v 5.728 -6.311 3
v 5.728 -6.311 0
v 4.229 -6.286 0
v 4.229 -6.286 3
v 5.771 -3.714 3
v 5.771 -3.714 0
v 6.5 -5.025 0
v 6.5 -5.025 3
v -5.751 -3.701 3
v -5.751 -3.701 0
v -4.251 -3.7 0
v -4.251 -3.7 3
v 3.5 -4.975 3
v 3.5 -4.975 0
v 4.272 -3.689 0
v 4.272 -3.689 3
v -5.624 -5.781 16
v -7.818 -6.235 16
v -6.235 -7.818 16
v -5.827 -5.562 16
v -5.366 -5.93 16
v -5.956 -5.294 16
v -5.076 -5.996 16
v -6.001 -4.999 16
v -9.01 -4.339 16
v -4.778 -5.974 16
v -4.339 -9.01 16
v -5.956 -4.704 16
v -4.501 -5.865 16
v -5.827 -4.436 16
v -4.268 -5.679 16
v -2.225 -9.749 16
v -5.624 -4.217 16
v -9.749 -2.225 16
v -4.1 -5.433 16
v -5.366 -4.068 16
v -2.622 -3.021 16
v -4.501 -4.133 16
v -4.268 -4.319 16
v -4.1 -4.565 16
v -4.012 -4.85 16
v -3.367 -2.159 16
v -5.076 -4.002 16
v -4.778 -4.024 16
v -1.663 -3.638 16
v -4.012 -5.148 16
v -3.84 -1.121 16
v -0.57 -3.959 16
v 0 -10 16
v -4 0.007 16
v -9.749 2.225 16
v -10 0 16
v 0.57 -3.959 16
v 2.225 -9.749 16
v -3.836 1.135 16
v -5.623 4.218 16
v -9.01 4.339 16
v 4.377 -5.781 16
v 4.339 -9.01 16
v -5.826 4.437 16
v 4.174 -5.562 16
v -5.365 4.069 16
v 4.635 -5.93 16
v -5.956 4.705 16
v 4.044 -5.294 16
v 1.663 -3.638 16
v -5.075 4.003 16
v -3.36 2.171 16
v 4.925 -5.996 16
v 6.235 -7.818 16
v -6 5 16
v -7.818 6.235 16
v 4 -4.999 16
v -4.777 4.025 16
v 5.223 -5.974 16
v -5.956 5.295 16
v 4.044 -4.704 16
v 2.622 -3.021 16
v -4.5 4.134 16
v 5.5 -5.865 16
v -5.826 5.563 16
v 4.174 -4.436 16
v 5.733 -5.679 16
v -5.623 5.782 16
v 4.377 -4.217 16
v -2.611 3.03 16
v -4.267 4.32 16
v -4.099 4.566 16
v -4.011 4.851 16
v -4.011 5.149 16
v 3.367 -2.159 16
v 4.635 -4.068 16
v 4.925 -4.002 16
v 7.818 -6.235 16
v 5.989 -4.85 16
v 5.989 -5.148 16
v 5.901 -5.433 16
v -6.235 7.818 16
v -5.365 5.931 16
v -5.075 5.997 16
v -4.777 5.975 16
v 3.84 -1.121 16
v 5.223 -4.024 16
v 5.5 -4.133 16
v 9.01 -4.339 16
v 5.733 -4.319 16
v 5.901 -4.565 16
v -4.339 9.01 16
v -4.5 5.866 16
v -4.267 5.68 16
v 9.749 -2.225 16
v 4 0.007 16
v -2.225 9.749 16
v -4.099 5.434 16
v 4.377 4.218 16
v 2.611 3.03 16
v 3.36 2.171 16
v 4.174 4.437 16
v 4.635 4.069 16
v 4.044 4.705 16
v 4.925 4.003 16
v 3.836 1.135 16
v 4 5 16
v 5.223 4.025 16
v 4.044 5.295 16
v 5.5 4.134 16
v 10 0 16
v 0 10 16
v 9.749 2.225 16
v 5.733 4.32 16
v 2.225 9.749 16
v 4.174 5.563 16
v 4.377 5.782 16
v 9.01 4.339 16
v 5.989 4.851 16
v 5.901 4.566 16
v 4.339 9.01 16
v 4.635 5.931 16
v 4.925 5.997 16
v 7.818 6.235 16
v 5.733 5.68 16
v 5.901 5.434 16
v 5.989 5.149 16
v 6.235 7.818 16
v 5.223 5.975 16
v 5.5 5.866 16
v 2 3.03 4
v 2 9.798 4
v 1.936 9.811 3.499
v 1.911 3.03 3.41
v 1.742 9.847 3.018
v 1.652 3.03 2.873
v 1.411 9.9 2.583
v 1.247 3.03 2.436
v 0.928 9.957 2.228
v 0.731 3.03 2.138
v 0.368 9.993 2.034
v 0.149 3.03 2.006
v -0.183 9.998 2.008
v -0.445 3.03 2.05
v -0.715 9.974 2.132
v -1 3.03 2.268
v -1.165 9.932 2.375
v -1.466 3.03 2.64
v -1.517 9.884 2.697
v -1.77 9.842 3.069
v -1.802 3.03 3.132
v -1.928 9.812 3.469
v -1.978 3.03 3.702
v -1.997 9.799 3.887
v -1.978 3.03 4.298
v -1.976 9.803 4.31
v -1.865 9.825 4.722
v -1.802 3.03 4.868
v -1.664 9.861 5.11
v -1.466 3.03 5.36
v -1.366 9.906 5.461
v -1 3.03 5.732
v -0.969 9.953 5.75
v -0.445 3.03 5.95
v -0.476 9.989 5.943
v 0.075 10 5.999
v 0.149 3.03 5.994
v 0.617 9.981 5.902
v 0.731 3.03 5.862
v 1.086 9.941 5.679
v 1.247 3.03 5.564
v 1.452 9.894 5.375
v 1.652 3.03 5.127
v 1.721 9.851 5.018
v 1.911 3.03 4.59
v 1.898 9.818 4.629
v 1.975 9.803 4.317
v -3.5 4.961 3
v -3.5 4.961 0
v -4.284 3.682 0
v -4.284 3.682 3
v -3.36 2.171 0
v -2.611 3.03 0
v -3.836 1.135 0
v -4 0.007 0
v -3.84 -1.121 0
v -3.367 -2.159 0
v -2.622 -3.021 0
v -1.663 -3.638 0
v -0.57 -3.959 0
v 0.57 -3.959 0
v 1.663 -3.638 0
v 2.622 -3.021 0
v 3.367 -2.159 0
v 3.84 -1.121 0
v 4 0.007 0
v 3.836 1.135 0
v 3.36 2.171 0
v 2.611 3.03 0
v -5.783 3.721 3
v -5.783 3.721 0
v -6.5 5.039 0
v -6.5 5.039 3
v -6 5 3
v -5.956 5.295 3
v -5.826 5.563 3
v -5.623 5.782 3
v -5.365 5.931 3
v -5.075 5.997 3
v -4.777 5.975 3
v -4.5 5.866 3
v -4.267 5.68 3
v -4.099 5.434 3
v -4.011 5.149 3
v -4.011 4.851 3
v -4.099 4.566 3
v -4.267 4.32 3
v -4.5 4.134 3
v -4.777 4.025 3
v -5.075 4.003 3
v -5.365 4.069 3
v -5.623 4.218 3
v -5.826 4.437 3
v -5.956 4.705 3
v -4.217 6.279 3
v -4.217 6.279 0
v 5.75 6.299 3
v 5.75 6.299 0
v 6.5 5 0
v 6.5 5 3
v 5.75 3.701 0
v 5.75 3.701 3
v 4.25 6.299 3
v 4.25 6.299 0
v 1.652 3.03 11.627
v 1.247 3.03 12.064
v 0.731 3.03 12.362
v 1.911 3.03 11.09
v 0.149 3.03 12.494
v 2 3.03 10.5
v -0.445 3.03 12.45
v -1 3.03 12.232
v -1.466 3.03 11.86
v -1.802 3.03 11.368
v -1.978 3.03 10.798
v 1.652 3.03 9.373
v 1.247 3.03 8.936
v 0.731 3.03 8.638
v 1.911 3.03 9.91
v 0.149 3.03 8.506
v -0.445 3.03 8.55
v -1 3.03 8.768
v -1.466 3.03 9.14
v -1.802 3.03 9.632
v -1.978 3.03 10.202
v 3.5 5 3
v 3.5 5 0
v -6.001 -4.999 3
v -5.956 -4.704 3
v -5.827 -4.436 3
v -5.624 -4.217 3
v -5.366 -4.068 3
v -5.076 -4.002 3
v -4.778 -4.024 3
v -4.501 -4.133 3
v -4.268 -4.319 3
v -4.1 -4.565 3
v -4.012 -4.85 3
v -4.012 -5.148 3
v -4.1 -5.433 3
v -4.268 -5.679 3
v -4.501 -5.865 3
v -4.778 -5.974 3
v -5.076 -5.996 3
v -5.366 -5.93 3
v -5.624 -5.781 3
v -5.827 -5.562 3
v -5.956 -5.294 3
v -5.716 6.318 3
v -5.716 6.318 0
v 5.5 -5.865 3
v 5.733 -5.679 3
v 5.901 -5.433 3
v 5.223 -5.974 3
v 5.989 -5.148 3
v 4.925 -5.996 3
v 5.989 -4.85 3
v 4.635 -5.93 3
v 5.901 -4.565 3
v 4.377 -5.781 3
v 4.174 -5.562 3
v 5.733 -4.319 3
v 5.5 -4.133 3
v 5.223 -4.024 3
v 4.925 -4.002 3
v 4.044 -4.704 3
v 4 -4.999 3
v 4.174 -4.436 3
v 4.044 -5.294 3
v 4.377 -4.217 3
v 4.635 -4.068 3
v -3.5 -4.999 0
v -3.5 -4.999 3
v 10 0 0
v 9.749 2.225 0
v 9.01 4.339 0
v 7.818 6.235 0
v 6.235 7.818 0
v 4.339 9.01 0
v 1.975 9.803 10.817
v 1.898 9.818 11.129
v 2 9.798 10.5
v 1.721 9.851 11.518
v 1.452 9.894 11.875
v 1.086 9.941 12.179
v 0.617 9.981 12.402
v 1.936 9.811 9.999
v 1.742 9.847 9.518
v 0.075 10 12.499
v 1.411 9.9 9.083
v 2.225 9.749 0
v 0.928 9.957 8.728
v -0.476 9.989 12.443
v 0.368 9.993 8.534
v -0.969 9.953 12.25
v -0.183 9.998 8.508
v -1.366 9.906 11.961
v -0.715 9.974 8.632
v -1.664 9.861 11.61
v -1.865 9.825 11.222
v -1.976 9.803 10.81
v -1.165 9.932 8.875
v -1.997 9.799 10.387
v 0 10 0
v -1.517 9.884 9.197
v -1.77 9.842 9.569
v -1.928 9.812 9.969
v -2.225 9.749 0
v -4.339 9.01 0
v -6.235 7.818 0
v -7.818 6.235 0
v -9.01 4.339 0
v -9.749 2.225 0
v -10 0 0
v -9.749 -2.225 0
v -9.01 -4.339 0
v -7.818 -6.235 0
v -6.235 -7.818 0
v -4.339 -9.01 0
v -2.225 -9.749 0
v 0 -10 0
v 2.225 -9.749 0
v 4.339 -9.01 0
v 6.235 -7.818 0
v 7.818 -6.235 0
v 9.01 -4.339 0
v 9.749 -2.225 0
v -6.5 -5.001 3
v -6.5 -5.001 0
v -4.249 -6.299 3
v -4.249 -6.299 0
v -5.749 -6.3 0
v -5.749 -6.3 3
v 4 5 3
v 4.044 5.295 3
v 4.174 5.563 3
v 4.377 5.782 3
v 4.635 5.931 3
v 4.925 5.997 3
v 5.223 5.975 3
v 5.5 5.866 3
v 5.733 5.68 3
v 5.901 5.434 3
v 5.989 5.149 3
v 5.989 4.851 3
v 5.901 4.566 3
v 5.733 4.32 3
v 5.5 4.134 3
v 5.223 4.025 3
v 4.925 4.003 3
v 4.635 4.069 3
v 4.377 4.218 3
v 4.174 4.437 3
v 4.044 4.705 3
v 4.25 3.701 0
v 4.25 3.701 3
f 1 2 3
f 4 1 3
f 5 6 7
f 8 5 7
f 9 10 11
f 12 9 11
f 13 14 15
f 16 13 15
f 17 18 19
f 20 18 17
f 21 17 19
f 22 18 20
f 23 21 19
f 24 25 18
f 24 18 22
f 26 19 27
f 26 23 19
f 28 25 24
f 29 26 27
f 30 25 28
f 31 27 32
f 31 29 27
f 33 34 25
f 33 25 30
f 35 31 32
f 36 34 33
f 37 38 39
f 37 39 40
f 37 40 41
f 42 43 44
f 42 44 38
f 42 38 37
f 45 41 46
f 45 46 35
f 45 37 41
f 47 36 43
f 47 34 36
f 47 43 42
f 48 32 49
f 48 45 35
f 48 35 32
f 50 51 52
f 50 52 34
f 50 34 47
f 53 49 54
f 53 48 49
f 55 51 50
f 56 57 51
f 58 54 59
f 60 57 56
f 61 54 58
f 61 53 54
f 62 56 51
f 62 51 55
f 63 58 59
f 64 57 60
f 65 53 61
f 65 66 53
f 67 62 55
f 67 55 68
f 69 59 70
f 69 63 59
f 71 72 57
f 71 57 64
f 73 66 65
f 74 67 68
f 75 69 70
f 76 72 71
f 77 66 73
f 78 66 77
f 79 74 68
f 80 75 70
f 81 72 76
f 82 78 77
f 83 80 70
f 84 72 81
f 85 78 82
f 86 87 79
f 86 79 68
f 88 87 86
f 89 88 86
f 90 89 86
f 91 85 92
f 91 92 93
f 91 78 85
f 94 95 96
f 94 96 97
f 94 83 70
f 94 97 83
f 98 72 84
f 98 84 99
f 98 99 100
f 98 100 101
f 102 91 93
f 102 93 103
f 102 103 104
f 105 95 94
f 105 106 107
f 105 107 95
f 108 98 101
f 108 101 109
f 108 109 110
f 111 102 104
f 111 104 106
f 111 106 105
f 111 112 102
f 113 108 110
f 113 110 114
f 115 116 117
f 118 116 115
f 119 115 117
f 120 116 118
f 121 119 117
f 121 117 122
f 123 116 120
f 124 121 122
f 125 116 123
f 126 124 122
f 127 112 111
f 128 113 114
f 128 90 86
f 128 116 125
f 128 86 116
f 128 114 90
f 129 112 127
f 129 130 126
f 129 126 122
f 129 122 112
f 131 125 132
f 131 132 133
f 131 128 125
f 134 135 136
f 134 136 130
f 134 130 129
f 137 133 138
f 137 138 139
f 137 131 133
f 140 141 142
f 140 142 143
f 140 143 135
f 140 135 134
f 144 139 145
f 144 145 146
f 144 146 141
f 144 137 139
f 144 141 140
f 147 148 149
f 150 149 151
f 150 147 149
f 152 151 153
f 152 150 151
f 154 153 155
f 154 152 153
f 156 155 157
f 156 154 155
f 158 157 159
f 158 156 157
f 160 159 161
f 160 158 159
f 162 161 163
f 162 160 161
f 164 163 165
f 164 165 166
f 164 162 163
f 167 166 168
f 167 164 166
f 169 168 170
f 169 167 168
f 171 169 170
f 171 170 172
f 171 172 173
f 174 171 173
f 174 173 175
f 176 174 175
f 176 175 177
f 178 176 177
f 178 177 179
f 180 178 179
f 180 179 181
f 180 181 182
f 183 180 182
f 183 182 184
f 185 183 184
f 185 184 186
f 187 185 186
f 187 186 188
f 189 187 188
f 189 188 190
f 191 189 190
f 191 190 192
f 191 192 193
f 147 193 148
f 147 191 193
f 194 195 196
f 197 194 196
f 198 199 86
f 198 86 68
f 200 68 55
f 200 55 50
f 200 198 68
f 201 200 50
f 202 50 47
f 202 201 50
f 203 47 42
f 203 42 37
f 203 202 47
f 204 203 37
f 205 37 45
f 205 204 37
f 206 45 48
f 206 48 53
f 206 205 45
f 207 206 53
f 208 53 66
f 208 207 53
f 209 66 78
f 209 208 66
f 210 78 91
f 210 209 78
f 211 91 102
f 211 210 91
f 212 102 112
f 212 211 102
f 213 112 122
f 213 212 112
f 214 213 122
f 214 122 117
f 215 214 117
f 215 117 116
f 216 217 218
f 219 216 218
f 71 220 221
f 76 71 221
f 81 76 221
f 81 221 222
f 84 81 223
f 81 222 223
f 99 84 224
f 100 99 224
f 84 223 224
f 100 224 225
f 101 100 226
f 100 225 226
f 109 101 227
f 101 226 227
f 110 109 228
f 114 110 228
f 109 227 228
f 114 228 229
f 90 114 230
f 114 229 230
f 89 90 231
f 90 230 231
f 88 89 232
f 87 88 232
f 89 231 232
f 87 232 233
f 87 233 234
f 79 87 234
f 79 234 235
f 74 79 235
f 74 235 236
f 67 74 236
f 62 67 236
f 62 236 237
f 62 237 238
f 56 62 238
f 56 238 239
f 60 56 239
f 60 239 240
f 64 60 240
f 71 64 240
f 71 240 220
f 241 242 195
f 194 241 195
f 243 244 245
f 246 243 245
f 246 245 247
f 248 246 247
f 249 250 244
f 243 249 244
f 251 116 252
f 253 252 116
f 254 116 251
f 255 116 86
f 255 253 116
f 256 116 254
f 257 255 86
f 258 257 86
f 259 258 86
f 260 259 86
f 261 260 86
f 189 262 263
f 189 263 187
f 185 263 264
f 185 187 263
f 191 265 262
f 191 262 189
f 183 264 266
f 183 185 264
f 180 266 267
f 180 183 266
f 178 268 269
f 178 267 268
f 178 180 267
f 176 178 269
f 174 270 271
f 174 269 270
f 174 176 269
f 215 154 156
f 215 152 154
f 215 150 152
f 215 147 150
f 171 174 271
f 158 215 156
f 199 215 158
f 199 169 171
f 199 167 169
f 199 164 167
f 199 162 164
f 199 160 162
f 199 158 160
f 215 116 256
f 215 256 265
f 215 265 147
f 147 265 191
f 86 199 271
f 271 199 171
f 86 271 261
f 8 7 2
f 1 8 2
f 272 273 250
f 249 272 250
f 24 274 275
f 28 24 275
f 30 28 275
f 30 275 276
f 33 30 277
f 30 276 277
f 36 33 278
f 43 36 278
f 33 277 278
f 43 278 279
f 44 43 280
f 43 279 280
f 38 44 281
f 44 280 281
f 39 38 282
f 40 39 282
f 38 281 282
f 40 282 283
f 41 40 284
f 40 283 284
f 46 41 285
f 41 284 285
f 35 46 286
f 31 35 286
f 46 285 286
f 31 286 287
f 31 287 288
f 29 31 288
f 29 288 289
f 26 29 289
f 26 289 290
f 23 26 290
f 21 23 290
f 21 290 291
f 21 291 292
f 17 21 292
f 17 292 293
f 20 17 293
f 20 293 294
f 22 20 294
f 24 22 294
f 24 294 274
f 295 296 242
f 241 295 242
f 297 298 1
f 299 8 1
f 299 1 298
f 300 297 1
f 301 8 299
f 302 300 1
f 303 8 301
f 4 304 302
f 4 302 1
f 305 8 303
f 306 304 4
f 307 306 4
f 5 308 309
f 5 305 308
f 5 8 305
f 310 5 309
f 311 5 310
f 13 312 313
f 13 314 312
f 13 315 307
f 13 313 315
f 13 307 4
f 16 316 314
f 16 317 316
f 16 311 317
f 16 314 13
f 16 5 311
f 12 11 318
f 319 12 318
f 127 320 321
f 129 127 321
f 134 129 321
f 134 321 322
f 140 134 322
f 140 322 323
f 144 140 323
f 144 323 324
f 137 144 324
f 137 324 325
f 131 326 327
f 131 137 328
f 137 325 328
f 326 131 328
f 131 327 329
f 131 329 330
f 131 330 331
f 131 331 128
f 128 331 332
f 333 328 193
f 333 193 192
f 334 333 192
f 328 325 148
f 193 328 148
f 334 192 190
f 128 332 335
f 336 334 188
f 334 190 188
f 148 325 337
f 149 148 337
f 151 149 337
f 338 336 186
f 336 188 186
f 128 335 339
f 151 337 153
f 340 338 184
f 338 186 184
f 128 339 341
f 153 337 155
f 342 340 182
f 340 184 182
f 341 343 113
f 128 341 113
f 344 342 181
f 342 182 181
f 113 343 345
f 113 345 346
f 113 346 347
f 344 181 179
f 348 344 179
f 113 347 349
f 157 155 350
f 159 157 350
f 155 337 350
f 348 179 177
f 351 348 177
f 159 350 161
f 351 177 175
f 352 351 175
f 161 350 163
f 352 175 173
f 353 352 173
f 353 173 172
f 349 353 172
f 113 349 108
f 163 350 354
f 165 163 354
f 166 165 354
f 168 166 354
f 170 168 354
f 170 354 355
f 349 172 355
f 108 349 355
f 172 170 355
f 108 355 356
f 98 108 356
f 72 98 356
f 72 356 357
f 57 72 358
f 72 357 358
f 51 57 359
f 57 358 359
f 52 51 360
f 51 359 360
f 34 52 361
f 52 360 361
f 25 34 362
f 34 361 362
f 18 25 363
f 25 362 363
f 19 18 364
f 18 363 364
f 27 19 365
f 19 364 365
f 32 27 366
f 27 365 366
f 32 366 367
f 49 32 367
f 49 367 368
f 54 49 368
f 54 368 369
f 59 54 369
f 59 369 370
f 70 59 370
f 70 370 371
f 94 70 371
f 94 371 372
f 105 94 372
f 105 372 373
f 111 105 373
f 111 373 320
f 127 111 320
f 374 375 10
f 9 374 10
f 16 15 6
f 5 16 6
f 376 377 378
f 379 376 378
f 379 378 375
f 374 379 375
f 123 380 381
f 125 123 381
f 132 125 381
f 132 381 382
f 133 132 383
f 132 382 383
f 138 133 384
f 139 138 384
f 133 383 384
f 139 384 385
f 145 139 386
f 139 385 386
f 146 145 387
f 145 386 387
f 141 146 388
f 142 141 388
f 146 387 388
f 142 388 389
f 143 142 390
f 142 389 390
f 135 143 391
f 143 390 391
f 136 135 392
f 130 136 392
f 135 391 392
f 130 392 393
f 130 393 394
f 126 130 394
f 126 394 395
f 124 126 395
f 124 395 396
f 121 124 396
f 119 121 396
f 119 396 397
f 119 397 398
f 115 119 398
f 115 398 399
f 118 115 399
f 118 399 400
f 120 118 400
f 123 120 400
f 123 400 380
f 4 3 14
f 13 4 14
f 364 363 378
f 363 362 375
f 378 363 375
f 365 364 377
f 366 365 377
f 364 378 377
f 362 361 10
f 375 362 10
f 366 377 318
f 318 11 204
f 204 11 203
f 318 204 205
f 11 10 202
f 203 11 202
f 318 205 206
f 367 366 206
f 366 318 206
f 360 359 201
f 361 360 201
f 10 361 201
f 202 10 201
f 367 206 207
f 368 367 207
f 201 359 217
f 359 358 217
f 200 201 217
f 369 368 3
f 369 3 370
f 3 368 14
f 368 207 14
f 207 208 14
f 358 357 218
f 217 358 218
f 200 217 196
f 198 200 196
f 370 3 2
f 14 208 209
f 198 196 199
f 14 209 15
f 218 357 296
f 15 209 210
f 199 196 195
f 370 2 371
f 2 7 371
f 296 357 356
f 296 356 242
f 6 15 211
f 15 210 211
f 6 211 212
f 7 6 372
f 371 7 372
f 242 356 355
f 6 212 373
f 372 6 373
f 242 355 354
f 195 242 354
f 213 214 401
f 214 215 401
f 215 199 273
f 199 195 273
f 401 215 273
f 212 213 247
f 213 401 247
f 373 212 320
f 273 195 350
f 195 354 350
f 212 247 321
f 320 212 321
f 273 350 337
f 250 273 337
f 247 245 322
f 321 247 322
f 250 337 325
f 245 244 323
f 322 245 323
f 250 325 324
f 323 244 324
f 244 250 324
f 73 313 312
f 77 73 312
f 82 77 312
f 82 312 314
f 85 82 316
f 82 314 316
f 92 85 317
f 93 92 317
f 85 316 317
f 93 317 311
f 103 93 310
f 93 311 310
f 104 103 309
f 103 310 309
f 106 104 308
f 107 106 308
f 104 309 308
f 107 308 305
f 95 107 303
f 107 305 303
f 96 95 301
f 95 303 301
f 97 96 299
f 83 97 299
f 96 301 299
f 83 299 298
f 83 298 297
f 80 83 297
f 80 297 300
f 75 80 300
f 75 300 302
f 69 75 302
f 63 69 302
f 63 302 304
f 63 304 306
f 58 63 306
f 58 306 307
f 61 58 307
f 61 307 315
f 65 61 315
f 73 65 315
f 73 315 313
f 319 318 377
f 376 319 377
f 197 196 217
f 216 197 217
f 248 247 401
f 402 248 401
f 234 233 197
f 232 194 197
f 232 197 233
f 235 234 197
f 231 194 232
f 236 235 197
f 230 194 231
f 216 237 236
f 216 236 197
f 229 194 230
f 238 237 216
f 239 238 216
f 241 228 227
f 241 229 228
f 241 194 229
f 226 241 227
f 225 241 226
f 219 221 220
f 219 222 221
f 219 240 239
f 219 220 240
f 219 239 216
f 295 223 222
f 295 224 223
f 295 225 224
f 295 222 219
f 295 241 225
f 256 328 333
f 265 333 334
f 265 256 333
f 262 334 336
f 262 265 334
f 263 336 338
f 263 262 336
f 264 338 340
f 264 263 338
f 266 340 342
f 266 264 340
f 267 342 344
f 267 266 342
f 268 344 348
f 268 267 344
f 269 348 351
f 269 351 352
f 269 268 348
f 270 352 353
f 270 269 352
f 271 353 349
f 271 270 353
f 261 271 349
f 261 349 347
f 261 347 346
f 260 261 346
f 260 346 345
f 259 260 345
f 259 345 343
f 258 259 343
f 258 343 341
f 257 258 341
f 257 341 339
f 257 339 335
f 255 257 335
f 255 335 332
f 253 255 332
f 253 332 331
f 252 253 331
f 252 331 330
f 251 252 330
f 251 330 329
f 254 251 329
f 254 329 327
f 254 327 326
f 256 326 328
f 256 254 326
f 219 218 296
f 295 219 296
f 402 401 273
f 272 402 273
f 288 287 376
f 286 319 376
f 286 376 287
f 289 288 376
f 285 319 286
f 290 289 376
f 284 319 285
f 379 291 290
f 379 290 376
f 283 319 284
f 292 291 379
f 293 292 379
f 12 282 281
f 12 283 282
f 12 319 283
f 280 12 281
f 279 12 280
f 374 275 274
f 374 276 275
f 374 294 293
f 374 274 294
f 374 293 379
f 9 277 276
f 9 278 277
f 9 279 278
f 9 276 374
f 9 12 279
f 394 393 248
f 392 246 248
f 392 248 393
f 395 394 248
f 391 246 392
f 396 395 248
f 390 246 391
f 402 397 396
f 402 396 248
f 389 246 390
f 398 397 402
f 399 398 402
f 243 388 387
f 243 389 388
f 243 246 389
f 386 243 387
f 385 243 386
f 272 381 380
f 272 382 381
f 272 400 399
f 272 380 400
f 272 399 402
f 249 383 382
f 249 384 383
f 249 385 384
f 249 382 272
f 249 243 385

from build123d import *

# Parameters (mm, degrees)
CROQUIS1_R              = 10
SALIENTE_EXTRUIR1_DEPTH = 16
CROQUIS2_R              = 2
CORTAR_EXTRUIR1_DEPTH   = 20
CORTAR_EXTRUIR2_DEPTH   = 3
CROQUIS5_R              = 1
CORTAR_EXTRUIR3_DEPTH   = 14.0000001


with BuildPart() as part:
    # Croquis1 → Saliente-Extruir1 (new body)
    with BuildSketch(Plane.XY):
        Circle(CROQUIS1_R)
        with BuildLine():
            Line((2.611340652, 3.03), (-2.611340652, 3.03))
            ThreePointArc((-2.611340652, 3.03), (0, -4), (2.611340652, 3.03))
        make_face(mode=Mode.SUBTRACT)
    extrude(amount=SALIENTE_EXTRUIR1_DEPTH)

    # Croquis2 → Cortar-Extruir1 (cut)
    with BuildSketch(Plane(origin=(0, 0, 0), x_dir=(1, 0, 0), z_dir=(0, 1, 0))):
        with Locations((0, -4)):
            Circle(CROQUIS2_R)
        with Locations((0, -10.5)):
            Circle(CROQUIS2_R)
    extrude(amount=CORTAR_EXTRUIR1_DEPTH, mode=Mode.SUBTRACT)

    # Croquis3 → Cortar-Extruir2 (cut)
    with BuildSketch(Plane(origin=(0, 0, 0), x_dir=(-1, 0, 0), z_dir=(0, 0, -1))):
        Polygon((-3.5, 5), (-4.25, 6.299038106), (-5.75, 6.299038106), (-6.5, 5), (-5.75, 3.700961894), (-4.25, 3.700961894), align=None)
        Polygon((6.499503191, 5.038602866), (5.716320533, 6.317909289), (4.216817342, 6.279306423), (3.500496809, 4.961397134), (4.283679467, 3.682090711), (5.783182658, 3.720693577), align=None)
        Polygon((6.499999707, -5.000936904), (5.750811237, -3.7014306), (4.250811529, -3.700493696), (3.500000293, -4.999063096), (4.249188763, -6.2985694), (5.749188471, -6.299506304), align=None)
        Polygon((-3.500204706, -4.975219447), (-4.271562941, -3.688748898), (-5.771358235, -3.713529451), (-6.499795294, -5.024780553), (-5.728437059, -6.311251102), (-4.228641765, -6.286470549), align=None)
    extrude(amount=-CORTAR_EXTRUIR2_DEPTH, mode=Mode.SUBTRACT)

    # Croquis5 → Cortar-Extruir3 (cut, through all)
    with BuildSketch(Plane(origin=(0, 0, 3), x_dir=(-1, 0, 0), z_dir=(0, 0, -1))):
        with Locations((-5, 5)):
            Circle(CROQUIS5_R)
        with Locations((5, 5)):
            Circle(CROQUIS5_R)
        with Locations((5.000811383, -4.999063096)):
            Circle(CROQUIS5_R)
        with Locations((-5, -4.999063096)):
            Circle(CROQUIS5_R)
    extrude(amount=-CORTAR_EXTRUIR3_DEPTH, mode=Mode.SUBTRACT)


solid = part.part
